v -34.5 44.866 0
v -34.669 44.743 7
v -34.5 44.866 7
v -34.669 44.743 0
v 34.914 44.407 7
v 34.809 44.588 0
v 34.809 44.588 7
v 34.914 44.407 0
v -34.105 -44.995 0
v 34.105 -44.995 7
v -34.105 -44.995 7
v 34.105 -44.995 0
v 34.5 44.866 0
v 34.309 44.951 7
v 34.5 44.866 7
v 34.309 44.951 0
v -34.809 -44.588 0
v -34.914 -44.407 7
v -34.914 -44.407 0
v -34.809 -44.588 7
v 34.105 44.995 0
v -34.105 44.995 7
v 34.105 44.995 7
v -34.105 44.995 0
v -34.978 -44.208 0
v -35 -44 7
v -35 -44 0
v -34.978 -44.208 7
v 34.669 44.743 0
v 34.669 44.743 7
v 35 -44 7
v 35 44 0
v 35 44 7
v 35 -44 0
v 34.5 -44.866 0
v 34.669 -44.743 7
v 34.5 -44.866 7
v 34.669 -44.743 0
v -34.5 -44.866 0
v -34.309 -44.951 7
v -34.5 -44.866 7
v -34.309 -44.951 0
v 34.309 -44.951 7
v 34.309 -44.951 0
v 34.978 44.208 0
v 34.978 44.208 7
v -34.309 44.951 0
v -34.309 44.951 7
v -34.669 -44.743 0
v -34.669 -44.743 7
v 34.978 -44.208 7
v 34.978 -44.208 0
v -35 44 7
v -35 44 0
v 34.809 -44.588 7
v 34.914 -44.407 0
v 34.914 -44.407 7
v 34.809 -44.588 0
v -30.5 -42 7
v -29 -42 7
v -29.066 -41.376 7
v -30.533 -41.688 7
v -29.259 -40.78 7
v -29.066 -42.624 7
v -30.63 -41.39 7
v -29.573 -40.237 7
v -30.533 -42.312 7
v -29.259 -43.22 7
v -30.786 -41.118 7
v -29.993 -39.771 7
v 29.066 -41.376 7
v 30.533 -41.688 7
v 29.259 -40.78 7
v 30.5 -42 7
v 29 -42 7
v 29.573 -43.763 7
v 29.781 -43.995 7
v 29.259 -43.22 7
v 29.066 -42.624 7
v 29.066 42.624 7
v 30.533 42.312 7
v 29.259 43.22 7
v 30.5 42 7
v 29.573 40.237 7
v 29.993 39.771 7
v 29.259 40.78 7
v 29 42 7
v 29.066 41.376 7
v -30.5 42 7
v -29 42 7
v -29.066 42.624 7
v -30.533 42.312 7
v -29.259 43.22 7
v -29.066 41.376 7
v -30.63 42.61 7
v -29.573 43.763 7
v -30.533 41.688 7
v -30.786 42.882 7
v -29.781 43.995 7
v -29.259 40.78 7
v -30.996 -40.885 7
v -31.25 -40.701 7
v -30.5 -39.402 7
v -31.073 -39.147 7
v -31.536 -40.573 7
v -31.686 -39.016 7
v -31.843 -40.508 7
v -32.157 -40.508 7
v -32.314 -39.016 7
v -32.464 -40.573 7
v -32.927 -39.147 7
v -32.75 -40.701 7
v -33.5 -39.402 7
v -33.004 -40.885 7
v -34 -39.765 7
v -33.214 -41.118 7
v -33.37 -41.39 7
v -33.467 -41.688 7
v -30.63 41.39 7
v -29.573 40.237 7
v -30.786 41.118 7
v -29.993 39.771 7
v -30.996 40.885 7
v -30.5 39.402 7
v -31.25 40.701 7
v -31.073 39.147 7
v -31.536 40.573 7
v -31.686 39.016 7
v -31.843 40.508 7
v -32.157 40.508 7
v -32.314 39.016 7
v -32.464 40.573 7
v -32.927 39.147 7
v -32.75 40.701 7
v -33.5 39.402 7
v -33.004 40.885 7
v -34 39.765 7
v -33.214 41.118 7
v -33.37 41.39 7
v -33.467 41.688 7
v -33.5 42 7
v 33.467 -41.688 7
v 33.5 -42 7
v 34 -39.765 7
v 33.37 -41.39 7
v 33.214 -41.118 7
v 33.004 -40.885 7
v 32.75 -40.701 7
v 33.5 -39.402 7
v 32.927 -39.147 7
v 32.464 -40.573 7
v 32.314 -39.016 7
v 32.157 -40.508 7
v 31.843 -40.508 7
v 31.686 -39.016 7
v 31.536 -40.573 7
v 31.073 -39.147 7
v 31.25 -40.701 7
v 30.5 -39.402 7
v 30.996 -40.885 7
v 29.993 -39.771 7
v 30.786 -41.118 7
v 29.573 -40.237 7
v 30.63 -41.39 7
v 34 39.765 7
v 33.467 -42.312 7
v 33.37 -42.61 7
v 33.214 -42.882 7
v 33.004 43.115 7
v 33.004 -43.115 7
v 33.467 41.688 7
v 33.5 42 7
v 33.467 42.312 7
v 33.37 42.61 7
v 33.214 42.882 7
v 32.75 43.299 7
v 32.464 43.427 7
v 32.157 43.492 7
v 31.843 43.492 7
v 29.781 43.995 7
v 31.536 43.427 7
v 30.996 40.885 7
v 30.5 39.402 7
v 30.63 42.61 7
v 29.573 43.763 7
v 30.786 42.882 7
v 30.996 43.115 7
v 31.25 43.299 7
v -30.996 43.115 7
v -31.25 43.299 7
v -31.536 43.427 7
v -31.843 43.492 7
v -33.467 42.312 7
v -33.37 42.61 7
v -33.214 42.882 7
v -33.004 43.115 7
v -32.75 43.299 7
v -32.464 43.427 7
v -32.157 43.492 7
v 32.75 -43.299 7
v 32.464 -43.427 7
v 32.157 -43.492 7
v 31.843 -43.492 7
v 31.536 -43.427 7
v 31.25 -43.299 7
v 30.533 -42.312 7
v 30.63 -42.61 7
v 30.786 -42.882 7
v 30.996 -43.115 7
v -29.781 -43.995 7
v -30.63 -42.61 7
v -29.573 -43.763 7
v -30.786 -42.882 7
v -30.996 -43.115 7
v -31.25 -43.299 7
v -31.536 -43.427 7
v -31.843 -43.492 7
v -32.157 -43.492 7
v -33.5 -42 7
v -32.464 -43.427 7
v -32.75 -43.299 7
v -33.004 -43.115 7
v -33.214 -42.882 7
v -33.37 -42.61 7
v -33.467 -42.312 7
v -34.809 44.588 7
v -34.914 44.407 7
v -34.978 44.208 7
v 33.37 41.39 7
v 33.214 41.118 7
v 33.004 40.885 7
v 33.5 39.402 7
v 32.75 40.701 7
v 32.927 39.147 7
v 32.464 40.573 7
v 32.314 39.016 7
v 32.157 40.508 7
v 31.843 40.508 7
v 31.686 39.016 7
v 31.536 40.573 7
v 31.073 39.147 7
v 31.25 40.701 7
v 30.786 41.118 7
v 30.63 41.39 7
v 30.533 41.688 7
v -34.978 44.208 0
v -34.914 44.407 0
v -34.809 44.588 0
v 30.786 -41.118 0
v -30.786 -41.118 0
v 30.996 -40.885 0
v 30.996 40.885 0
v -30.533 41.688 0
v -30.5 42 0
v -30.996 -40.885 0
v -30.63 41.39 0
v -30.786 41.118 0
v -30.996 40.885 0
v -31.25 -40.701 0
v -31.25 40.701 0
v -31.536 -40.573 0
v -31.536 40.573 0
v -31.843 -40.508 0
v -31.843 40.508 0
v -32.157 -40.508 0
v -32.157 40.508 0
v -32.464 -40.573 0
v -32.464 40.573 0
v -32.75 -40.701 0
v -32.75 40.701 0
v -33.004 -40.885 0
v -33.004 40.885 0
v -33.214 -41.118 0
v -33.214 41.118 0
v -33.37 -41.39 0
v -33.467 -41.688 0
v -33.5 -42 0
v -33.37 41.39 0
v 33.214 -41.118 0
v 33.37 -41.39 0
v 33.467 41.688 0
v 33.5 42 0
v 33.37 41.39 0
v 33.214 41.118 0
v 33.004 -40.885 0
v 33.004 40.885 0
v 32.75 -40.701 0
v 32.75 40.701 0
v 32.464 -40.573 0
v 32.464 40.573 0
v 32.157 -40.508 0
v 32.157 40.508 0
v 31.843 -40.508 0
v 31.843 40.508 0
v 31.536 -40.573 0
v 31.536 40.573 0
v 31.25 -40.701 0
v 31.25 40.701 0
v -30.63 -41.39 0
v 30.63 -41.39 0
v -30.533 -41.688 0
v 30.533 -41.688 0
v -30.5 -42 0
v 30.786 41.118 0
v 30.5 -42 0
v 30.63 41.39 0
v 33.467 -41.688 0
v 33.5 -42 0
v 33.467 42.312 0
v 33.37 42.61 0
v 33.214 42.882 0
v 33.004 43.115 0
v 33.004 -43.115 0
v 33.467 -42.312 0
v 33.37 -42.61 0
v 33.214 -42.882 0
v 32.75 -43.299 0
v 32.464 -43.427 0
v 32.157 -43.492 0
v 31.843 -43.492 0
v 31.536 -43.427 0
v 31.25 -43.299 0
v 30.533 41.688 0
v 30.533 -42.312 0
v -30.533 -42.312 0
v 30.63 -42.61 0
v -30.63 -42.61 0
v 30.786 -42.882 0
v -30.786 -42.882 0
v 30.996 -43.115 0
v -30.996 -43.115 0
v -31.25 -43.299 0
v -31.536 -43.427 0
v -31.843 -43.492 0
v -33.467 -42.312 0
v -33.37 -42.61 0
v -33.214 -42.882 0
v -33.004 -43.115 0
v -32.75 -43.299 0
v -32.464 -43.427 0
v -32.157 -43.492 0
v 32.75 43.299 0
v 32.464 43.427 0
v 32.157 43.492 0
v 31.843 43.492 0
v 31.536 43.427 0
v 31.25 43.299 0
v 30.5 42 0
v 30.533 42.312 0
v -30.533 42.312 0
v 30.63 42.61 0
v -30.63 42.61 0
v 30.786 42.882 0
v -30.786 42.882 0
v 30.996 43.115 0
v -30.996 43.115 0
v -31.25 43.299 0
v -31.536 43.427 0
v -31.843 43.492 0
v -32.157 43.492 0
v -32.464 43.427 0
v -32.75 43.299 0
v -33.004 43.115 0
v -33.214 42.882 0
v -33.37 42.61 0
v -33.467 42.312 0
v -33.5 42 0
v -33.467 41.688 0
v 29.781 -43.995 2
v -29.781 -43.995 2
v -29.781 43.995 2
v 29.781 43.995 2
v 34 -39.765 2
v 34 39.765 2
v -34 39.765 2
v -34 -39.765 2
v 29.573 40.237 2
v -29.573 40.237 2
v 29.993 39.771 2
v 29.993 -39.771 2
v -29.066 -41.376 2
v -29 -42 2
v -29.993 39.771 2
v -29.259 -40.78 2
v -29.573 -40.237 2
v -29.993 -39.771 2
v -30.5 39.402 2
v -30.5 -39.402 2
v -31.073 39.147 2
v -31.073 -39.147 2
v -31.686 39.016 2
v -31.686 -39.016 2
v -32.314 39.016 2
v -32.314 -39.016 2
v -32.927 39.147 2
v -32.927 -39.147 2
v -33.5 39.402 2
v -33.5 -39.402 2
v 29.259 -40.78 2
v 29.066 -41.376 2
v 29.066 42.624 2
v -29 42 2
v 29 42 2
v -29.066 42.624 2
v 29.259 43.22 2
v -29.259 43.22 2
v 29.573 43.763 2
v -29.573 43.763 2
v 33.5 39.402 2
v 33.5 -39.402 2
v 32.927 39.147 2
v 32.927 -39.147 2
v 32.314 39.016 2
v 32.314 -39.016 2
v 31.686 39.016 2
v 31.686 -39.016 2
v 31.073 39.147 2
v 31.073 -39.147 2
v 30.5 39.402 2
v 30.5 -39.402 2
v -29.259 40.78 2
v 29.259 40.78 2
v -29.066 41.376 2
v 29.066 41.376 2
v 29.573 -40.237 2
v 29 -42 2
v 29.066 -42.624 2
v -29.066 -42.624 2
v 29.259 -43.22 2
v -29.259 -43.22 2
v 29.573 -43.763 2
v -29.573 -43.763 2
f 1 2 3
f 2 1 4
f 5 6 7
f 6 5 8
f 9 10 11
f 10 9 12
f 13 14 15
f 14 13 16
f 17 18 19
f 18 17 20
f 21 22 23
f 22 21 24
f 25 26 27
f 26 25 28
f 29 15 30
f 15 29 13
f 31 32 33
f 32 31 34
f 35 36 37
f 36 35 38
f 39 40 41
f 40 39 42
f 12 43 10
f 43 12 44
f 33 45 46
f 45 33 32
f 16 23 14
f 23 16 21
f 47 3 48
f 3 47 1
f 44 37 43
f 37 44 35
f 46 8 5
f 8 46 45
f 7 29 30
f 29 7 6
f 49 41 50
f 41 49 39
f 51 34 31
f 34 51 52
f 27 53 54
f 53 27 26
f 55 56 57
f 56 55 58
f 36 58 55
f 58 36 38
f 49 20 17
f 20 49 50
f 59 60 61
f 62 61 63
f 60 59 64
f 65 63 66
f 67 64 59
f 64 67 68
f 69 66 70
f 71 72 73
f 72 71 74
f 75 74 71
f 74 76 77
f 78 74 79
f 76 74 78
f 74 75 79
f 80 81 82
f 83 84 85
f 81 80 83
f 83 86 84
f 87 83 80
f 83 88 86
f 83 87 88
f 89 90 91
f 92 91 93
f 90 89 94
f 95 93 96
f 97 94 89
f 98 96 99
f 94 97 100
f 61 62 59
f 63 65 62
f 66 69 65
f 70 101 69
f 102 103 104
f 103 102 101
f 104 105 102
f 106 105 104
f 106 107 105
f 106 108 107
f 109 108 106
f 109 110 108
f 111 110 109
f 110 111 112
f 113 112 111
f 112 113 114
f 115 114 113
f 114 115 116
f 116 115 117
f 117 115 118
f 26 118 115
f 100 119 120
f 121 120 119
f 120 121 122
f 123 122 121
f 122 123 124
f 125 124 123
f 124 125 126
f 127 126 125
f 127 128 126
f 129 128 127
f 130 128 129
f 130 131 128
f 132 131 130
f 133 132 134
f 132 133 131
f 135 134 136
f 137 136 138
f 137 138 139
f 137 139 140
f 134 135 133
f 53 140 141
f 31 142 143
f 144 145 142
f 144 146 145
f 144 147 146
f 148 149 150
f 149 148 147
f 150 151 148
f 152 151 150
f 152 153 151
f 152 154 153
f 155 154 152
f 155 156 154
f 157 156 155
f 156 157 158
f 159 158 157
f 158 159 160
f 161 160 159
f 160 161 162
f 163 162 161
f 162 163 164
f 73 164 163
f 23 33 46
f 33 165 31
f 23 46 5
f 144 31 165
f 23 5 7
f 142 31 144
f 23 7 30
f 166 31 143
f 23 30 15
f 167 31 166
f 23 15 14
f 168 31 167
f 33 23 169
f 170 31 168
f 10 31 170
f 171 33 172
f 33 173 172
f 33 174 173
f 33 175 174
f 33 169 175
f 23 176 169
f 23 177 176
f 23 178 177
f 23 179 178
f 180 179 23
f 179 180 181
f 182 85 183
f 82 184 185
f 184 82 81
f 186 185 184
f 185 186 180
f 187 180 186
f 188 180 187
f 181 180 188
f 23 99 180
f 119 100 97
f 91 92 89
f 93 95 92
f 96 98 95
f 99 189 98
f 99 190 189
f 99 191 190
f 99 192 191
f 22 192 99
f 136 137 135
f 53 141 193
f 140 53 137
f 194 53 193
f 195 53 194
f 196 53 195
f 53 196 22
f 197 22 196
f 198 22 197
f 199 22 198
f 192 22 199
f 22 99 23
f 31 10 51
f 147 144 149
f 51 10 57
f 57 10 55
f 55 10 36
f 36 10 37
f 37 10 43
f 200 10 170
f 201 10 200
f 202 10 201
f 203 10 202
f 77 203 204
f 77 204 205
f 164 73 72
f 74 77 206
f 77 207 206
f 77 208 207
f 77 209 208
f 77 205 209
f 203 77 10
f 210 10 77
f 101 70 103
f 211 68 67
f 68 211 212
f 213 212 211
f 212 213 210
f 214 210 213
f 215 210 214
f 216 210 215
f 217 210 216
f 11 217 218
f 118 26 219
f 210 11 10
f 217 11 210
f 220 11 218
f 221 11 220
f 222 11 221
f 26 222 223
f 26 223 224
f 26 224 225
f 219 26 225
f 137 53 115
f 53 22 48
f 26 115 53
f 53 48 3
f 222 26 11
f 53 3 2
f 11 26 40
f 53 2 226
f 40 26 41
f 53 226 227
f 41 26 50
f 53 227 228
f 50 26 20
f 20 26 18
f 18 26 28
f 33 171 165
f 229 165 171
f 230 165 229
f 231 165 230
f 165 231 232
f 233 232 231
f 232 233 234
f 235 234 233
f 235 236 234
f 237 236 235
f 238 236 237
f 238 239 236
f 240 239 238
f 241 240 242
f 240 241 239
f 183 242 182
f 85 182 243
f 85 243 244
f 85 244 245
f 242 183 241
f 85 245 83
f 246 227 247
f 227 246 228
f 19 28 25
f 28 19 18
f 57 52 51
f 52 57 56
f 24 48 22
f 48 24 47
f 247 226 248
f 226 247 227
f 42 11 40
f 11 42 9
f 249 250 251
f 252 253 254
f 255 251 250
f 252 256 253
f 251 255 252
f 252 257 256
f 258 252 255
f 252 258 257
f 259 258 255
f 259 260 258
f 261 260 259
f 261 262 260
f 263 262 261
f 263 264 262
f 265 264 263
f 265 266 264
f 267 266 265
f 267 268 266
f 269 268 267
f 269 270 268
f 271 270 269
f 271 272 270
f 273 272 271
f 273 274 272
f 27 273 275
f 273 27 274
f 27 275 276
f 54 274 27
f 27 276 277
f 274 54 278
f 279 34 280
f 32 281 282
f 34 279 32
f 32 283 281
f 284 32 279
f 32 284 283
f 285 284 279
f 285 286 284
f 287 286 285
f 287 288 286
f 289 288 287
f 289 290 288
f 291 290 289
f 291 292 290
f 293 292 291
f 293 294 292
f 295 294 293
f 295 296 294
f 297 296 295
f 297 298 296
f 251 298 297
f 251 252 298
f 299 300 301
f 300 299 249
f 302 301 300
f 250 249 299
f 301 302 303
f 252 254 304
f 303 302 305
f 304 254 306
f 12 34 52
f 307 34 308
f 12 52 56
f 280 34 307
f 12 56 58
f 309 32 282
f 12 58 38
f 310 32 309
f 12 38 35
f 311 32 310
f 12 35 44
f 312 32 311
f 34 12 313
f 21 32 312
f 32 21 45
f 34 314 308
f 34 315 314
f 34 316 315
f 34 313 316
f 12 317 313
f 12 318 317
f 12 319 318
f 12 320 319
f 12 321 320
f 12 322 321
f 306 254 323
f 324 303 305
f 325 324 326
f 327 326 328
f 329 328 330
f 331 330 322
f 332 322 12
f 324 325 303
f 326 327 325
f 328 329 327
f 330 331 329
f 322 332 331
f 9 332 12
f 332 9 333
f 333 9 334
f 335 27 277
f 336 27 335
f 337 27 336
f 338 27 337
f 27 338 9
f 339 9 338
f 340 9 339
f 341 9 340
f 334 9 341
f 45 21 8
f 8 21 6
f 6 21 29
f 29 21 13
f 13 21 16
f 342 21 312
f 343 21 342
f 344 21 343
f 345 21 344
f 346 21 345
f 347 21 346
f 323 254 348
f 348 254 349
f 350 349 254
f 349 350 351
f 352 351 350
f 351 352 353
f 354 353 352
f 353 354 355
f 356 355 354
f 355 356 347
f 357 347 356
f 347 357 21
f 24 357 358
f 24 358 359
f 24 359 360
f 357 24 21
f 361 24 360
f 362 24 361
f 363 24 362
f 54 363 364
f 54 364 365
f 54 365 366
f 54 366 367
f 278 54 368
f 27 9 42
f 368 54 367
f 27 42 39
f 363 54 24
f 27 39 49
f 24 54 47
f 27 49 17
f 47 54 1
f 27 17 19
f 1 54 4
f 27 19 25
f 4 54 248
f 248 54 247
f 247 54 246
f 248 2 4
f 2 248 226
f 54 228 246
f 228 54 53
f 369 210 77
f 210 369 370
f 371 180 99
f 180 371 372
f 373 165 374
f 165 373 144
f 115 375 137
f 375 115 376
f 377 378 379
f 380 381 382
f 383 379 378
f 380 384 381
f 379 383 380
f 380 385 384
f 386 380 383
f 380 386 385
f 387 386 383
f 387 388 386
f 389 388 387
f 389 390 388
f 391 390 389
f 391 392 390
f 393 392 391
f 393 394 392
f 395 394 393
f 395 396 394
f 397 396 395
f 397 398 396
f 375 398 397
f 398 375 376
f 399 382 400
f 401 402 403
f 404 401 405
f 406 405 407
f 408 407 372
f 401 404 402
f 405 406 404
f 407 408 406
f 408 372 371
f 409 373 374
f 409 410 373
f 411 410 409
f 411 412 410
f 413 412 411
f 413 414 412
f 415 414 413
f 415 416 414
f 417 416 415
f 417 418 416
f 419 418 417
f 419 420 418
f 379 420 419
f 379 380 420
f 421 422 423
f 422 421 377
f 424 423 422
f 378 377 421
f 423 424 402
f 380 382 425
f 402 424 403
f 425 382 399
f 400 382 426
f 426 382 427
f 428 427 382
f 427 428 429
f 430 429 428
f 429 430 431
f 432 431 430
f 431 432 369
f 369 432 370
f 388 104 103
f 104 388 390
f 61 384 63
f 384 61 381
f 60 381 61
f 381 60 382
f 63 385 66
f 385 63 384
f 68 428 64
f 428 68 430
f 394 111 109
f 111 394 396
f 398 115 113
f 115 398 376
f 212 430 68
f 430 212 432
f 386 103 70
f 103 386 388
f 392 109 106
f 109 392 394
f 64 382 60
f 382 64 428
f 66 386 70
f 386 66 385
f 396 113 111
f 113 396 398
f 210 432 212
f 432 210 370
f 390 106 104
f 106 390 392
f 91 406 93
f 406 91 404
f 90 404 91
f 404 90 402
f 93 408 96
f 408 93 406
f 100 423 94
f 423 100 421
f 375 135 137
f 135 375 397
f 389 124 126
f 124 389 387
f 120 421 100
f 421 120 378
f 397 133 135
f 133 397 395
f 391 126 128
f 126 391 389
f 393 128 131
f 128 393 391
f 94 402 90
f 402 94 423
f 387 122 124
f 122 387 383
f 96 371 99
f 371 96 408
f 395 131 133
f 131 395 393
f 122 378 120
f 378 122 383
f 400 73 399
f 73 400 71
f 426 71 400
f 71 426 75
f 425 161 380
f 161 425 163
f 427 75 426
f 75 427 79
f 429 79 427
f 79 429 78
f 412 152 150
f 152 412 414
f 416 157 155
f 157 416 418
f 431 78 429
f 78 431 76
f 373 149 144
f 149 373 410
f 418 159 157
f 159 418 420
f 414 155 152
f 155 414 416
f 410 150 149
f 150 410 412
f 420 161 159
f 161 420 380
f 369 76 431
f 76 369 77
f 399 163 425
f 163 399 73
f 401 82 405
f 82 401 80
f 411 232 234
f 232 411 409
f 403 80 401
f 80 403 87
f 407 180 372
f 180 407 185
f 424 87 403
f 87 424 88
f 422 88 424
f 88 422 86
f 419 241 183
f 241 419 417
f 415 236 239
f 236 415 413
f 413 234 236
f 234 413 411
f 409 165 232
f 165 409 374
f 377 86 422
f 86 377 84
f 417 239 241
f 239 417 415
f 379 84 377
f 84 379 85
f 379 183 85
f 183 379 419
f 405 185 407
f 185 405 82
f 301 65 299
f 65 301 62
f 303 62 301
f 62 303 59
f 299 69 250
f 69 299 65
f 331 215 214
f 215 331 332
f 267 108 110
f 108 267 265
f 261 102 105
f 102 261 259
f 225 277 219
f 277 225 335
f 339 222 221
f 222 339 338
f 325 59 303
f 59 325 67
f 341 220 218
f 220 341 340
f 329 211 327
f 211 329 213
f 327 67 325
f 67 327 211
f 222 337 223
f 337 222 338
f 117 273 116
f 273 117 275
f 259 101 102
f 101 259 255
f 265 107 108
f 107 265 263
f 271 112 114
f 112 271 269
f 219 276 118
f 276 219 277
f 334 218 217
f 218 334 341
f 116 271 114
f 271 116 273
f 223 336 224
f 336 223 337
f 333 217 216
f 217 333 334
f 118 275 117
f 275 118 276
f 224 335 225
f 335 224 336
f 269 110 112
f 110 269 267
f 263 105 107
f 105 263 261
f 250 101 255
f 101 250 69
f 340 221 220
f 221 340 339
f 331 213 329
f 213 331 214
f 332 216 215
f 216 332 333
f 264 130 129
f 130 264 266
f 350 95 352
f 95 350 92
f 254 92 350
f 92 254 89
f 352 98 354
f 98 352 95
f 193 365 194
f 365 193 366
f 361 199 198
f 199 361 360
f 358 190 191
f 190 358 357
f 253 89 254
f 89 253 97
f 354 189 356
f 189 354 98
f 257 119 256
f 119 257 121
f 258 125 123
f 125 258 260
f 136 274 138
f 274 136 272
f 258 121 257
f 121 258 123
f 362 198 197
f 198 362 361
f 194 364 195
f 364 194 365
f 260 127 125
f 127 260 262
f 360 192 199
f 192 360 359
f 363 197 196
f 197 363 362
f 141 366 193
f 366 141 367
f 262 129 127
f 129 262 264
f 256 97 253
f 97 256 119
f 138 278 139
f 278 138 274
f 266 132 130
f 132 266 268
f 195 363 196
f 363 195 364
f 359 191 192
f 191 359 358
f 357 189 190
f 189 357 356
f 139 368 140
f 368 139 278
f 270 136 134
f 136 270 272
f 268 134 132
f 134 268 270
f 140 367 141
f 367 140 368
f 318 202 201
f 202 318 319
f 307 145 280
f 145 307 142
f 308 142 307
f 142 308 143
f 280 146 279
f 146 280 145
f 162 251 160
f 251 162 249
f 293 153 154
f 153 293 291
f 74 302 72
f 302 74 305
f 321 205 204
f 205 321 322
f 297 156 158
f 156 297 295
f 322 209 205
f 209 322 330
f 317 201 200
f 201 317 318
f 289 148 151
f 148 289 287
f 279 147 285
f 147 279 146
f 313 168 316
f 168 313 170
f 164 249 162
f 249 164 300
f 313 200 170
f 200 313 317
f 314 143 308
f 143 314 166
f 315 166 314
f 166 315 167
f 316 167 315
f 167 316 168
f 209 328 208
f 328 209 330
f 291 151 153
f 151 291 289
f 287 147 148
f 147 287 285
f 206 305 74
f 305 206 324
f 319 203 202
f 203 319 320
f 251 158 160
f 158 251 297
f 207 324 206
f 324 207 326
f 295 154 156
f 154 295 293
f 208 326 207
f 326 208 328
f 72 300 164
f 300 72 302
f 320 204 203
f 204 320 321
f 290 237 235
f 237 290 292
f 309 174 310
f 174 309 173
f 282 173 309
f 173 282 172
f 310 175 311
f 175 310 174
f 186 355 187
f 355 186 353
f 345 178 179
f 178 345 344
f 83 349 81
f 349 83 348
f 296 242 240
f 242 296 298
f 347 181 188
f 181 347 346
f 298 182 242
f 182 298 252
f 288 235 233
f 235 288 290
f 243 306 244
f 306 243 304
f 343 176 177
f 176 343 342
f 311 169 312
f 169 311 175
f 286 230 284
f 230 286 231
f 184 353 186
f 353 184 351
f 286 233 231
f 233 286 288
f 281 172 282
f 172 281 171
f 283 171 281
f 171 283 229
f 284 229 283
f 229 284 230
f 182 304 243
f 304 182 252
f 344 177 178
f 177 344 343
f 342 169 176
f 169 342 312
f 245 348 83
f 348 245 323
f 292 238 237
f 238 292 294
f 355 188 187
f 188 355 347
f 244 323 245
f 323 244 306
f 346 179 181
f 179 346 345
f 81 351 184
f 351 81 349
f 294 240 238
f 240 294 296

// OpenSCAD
WIDTH = 70; // 28; // 40; // 114; // 100; // 27; //50; // 90; // 53; // 70; // 42;
LENGTH = 90; // 148; // 60; // 139; // 160; // 100; // 70; // 150; // 77; // 90; // 62;
CORNER_DIA = 2; // 5; // 5;
THICKNESS = 2;

MOUNT_HOLE_SPACING_X = 64; // 24; // 36; // 107; // 88; // 23; // 46; // 84; // 45; // 65; //36;
MOUNT_HOLE_SPACING_Y = 84; // 144; // 56; // 133; // 155; // 95; //66; // 144; // 70; // 83; //56;
MOUNT_HOLE_DIA = 3; // 2; // 3.5; // 2; // 2.5; // 3.5;
MOUNT_HOLE_STANDOFF_DIA = min(WIDTH - MOUNT_HOLE_SPACING_X, LENGTH - MOUNT_HOLE_SPACING_Y);
MOUNT_HOLE_STANDOFF_HEIGHT = 5; // 20; // 3; // 3;

ACCESS_SLOT_WIDTH = 0; // 21; // 0; // 0;
ACCESS_SLOT_HEIGHT = 4;


$fn = 30;

module mounting_holes(width, length, height, dia) {
  for(i = [-1, 1]) {
    for(j = [-1, 1]) {
      translate([i * width/2, j * length/2, 0])
      cylinder(d = dia, h = height);
    }
  }
}

module rounded_cube(width, length, height, corner_dia) {
  hull() {
    mounting_holes(width - corner_dia, length - corner_dia, height, corner_dia);
  }
}

module base() {
  difference() {
    union() {
      difference() {
        rounded_cube(WIDTH, LENGTH, MOUNT_HOLE_STANDOFF_HEIGHT + THICKNESS, CORNER_DIA);
        translate([0, 0, THICKNESS])
        rounded_cube(WIDTH - THICKNESS, LENGTH - THICKNESS, MOUNT_HOLE_STANDOFF_HEIGHT, CORNER_DIA);
      }
      mounting_holes(MOUNT_HOLE_SPACING_X, MOUNT_HOLE_SPACING_Y, MOUNT_HOLE_STANDOFF_HEIGHT + THICKNESS, MOUNT_HOLE_STANDOFF_DIA);
    }
    mounting_holes(MOUNT_HOLE_SPACING_X, MOUNT_HOLE_SPACING_Y, MOUNT_HOLE_STANDOFF_HEIGHT + THICKNESS, MOUNT_HOLE_DIA);

    if (ACCESS_SLOT_WIDTH > 0) {
      translate([0, 0, MOUNT_HOLE_STANDOFF_HEIGHT + THICKNESS - ACCESS_SLOT_HEIGHT])
      rounded_cube(ACCESS_SLOT_WIDTH, LENGTH + 2 * THICKNESS, ACCESS_SLOT_HEIGHT, 1);
    }
  }
}

base();
